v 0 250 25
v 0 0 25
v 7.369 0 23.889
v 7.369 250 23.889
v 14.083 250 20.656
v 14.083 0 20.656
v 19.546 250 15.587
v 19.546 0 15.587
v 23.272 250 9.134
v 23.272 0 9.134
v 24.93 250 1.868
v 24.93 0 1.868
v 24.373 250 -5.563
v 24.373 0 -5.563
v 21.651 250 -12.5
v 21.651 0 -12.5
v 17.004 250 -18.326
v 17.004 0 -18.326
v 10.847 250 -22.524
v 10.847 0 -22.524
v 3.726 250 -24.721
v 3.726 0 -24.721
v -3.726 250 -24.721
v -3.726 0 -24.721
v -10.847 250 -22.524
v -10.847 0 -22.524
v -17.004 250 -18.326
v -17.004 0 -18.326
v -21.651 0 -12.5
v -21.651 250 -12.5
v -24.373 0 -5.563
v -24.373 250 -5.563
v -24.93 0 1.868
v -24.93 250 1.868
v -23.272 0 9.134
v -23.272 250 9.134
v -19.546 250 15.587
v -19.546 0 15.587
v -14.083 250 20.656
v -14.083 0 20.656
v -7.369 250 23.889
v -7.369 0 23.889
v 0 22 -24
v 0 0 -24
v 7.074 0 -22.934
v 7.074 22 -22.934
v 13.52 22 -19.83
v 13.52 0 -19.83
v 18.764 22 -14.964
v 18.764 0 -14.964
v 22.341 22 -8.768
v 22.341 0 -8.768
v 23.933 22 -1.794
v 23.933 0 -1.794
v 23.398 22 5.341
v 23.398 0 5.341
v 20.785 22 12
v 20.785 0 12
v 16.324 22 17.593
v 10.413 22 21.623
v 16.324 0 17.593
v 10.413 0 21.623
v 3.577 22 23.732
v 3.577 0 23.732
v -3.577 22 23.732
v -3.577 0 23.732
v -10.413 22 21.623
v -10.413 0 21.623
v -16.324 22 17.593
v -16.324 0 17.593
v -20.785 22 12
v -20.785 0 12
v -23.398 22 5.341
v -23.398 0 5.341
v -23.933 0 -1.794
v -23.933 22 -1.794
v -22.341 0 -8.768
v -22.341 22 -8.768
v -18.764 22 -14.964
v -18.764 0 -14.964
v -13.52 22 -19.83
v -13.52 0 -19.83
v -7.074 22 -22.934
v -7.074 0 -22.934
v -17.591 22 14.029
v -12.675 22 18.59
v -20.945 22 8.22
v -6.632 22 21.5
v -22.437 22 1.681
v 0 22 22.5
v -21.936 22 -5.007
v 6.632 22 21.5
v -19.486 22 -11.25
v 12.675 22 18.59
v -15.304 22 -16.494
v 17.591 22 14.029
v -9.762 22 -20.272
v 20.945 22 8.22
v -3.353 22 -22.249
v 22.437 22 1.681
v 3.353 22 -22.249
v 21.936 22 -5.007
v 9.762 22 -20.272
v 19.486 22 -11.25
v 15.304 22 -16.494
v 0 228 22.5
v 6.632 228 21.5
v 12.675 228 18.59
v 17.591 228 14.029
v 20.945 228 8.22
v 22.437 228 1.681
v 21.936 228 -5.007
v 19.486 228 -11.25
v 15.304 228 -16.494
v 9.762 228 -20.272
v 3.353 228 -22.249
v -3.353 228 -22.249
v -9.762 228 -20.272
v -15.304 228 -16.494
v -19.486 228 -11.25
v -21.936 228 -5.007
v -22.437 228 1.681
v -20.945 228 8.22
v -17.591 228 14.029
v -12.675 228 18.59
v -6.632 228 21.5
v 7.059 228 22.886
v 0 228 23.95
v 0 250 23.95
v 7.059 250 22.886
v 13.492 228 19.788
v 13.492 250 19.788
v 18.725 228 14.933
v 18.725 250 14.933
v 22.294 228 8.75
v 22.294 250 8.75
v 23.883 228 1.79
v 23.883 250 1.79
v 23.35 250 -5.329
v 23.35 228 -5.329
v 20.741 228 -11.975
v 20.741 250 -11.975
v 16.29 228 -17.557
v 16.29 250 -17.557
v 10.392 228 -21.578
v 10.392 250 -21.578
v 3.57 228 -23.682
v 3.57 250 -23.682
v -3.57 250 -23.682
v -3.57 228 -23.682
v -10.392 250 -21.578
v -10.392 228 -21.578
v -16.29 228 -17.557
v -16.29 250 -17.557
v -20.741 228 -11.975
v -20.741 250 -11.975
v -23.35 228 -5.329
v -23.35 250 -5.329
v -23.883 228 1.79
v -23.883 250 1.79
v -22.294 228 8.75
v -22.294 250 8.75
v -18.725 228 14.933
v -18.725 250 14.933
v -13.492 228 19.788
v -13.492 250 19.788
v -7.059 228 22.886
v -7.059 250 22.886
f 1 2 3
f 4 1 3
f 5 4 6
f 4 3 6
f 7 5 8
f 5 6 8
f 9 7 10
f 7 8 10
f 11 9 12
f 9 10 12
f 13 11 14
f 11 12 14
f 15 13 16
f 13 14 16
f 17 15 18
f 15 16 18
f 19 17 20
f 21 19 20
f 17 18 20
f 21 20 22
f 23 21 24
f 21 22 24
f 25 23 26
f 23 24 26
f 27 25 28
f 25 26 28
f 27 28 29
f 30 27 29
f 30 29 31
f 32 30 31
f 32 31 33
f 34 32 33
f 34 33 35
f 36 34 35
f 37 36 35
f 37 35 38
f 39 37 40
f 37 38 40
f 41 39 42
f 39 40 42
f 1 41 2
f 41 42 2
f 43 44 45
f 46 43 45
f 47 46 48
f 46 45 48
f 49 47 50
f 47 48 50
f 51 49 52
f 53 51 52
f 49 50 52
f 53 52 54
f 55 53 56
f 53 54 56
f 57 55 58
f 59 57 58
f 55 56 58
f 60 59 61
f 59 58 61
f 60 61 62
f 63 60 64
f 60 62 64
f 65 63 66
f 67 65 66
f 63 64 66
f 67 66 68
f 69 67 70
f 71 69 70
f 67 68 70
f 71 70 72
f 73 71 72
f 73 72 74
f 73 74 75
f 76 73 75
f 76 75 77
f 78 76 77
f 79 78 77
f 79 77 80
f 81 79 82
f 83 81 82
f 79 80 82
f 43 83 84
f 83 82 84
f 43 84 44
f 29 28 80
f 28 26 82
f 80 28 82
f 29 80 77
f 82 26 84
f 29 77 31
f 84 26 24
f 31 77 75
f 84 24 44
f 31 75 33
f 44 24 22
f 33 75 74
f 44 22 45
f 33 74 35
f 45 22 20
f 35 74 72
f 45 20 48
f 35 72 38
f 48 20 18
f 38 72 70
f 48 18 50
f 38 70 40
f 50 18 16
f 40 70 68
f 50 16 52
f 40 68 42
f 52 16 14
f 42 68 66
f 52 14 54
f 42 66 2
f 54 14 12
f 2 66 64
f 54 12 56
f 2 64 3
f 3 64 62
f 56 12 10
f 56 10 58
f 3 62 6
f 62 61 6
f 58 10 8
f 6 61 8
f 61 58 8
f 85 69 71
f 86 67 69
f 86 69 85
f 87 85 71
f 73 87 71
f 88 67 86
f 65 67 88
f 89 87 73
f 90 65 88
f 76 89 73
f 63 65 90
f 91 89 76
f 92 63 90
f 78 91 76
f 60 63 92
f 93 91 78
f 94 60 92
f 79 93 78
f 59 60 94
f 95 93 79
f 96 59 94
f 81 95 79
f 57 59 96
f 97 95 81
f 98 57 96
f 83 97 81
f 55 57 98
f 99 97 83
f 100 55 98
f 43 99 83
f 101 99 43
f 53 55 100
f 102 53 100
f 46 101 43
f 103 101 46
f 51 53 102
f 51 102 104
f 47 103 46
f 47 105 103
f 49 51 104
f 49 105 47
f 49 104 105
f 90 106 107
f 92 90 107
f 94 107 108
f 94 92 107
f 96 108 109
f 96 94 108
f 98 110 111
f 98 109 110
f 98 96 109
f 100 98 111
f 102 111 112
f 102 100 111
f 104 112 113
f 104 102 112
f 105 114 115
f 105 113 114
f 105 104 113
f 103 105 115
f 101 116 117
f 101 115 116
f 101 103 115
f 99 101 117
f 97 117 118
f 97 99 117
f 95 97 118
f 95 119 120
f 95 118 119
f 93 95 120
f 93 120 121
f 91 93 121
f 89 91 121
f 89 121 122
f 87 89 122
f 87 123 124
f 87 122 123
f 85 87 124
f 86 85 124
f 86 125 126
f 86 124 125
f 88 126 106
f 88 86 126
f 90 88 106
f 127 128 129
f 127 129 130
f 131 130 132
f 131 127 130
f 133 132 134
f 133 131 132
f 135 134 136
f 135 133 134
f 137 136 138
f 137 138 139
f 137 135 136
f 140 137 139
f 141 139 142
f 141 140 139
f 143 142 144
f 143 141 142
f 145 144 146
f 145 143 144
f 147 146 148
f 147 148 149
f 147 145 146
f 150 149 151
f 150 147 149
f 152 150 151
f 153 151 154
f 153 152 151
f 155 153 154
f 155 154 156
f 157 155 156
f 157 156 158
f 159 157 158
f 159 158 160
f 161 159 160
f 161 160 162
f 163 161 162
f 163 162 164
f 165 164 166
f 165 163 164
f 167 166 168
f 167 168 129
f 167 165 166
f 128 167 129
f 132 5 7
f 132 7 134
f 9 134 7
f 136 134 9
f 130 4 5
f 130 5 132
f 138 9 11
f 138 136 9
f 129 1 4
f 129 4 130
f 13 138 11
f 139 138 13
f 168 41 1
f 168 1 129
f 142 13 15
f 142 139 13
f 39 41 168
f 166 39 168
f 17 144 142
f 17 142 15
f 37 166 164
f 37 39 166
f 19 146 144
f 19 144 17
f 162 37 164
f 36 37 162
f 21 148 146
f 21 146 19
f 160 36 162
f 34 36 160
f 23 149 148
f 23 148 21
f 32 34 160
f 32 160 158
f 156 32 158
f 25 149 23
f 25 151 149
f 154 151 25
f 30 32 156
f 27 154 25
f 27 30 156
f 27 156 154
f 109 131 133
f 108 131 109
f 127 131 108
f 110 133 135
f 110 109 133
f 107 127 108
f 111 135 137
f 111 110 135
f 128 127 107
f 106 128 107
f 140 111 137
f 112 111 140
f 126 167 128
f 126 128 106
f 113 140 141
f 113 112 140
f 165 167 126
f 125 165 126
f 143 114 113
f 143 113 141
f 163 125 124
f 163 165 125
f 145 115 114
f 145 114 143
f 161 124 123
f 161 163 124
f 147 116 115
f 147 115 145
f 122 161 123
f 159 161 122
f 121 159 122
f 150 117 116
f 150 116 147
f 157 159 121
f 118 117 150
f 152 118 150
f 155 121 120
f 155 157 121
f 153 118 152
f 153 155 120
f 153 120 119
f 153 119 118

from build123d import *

# Parameters (mm, degrees)
SKETCH_1_R          = 25
SKETCH_1_R_2        = 22.5
EXTRUDE_1_DEPTH     = 250
SKETCH_2_R          = 24
CUT_EXTRUDE_1_DEPTH = 22
CUT_EXTRUDE_START   = -22
SKETCH_3_R          = 24
CUT_EXTRUDE_2_DEPTH = 22
SKETCH_4_R          = 24
SKETCH_4_R_2        = 23.95
EXTRUDE_2_DEPTH     = 22


with BuildPart() as part:
    # Эскиз1 → Бобышка-Вытянуть1 (new body)
    with BuildSketch(Plane(origin=(0, 0, 0), x_dir=(1, 0, 0), z_dir=(0, 1, 0))):
        with Locations(Location((0, 0, 0), (0, 0, 270))):
            Circle(SKETCH_1_R)
        with Locations(Location((0, 0, 0), (0, 0, 270))):
            Circle(SKETCH_1_R_2, mode=Mode.SUBTRACT)
    extrude(amount=EXTRUDE_1_DEPTH)

    # Эскиз2 → Вырез-Вытянуть1 (cut)
    with BuildSketch(Plane.XZ):
        with Locations(Location((0, 0, 0), (0, 0, 270))):
            Circle(SKETCH_2_R)
    extrude(amount=-CUT_EXTRUDE_1_DEPTH, mode=Mode.SUBTRACT)

    # Эскиз3 → Вырез-Вытянуть2 (cut)
    with BuildSketch(Plane(origin=(0, 250, 0), x_dir=(1, 0, 0), z_dir=(0, 1, 0)).offset(CUT_EXTRUDE_START)):
        with Locations(Location((0, 0, 0), (0, 0, 90))):
            Circle(SKETCH_3_R)
    extrude(amount=CUT_EXTRUDE_2_DEPTH, mode=Mode.SUBTRACT)

    # Эскиз4 → Бобышка-Вытянуть2 (add)
    with BuildSketch(Plane(origin=(0, 228, 0), x_dir=(1, 0, 0), z_dir=(0, 1, 0))):
        with Locations(Location((0, 0, 0), (0, 0, 90))):
            Circle(SKETCH_4_R)
        with Locations(Location((0, 0, 0), (0, 0, 270))):
            Circle(SKETCH_4_R_2, mode=Mode.SUBTRACT)
    extrude(amount=EXTRUDE_2_DEPTH)


solid = part.part
